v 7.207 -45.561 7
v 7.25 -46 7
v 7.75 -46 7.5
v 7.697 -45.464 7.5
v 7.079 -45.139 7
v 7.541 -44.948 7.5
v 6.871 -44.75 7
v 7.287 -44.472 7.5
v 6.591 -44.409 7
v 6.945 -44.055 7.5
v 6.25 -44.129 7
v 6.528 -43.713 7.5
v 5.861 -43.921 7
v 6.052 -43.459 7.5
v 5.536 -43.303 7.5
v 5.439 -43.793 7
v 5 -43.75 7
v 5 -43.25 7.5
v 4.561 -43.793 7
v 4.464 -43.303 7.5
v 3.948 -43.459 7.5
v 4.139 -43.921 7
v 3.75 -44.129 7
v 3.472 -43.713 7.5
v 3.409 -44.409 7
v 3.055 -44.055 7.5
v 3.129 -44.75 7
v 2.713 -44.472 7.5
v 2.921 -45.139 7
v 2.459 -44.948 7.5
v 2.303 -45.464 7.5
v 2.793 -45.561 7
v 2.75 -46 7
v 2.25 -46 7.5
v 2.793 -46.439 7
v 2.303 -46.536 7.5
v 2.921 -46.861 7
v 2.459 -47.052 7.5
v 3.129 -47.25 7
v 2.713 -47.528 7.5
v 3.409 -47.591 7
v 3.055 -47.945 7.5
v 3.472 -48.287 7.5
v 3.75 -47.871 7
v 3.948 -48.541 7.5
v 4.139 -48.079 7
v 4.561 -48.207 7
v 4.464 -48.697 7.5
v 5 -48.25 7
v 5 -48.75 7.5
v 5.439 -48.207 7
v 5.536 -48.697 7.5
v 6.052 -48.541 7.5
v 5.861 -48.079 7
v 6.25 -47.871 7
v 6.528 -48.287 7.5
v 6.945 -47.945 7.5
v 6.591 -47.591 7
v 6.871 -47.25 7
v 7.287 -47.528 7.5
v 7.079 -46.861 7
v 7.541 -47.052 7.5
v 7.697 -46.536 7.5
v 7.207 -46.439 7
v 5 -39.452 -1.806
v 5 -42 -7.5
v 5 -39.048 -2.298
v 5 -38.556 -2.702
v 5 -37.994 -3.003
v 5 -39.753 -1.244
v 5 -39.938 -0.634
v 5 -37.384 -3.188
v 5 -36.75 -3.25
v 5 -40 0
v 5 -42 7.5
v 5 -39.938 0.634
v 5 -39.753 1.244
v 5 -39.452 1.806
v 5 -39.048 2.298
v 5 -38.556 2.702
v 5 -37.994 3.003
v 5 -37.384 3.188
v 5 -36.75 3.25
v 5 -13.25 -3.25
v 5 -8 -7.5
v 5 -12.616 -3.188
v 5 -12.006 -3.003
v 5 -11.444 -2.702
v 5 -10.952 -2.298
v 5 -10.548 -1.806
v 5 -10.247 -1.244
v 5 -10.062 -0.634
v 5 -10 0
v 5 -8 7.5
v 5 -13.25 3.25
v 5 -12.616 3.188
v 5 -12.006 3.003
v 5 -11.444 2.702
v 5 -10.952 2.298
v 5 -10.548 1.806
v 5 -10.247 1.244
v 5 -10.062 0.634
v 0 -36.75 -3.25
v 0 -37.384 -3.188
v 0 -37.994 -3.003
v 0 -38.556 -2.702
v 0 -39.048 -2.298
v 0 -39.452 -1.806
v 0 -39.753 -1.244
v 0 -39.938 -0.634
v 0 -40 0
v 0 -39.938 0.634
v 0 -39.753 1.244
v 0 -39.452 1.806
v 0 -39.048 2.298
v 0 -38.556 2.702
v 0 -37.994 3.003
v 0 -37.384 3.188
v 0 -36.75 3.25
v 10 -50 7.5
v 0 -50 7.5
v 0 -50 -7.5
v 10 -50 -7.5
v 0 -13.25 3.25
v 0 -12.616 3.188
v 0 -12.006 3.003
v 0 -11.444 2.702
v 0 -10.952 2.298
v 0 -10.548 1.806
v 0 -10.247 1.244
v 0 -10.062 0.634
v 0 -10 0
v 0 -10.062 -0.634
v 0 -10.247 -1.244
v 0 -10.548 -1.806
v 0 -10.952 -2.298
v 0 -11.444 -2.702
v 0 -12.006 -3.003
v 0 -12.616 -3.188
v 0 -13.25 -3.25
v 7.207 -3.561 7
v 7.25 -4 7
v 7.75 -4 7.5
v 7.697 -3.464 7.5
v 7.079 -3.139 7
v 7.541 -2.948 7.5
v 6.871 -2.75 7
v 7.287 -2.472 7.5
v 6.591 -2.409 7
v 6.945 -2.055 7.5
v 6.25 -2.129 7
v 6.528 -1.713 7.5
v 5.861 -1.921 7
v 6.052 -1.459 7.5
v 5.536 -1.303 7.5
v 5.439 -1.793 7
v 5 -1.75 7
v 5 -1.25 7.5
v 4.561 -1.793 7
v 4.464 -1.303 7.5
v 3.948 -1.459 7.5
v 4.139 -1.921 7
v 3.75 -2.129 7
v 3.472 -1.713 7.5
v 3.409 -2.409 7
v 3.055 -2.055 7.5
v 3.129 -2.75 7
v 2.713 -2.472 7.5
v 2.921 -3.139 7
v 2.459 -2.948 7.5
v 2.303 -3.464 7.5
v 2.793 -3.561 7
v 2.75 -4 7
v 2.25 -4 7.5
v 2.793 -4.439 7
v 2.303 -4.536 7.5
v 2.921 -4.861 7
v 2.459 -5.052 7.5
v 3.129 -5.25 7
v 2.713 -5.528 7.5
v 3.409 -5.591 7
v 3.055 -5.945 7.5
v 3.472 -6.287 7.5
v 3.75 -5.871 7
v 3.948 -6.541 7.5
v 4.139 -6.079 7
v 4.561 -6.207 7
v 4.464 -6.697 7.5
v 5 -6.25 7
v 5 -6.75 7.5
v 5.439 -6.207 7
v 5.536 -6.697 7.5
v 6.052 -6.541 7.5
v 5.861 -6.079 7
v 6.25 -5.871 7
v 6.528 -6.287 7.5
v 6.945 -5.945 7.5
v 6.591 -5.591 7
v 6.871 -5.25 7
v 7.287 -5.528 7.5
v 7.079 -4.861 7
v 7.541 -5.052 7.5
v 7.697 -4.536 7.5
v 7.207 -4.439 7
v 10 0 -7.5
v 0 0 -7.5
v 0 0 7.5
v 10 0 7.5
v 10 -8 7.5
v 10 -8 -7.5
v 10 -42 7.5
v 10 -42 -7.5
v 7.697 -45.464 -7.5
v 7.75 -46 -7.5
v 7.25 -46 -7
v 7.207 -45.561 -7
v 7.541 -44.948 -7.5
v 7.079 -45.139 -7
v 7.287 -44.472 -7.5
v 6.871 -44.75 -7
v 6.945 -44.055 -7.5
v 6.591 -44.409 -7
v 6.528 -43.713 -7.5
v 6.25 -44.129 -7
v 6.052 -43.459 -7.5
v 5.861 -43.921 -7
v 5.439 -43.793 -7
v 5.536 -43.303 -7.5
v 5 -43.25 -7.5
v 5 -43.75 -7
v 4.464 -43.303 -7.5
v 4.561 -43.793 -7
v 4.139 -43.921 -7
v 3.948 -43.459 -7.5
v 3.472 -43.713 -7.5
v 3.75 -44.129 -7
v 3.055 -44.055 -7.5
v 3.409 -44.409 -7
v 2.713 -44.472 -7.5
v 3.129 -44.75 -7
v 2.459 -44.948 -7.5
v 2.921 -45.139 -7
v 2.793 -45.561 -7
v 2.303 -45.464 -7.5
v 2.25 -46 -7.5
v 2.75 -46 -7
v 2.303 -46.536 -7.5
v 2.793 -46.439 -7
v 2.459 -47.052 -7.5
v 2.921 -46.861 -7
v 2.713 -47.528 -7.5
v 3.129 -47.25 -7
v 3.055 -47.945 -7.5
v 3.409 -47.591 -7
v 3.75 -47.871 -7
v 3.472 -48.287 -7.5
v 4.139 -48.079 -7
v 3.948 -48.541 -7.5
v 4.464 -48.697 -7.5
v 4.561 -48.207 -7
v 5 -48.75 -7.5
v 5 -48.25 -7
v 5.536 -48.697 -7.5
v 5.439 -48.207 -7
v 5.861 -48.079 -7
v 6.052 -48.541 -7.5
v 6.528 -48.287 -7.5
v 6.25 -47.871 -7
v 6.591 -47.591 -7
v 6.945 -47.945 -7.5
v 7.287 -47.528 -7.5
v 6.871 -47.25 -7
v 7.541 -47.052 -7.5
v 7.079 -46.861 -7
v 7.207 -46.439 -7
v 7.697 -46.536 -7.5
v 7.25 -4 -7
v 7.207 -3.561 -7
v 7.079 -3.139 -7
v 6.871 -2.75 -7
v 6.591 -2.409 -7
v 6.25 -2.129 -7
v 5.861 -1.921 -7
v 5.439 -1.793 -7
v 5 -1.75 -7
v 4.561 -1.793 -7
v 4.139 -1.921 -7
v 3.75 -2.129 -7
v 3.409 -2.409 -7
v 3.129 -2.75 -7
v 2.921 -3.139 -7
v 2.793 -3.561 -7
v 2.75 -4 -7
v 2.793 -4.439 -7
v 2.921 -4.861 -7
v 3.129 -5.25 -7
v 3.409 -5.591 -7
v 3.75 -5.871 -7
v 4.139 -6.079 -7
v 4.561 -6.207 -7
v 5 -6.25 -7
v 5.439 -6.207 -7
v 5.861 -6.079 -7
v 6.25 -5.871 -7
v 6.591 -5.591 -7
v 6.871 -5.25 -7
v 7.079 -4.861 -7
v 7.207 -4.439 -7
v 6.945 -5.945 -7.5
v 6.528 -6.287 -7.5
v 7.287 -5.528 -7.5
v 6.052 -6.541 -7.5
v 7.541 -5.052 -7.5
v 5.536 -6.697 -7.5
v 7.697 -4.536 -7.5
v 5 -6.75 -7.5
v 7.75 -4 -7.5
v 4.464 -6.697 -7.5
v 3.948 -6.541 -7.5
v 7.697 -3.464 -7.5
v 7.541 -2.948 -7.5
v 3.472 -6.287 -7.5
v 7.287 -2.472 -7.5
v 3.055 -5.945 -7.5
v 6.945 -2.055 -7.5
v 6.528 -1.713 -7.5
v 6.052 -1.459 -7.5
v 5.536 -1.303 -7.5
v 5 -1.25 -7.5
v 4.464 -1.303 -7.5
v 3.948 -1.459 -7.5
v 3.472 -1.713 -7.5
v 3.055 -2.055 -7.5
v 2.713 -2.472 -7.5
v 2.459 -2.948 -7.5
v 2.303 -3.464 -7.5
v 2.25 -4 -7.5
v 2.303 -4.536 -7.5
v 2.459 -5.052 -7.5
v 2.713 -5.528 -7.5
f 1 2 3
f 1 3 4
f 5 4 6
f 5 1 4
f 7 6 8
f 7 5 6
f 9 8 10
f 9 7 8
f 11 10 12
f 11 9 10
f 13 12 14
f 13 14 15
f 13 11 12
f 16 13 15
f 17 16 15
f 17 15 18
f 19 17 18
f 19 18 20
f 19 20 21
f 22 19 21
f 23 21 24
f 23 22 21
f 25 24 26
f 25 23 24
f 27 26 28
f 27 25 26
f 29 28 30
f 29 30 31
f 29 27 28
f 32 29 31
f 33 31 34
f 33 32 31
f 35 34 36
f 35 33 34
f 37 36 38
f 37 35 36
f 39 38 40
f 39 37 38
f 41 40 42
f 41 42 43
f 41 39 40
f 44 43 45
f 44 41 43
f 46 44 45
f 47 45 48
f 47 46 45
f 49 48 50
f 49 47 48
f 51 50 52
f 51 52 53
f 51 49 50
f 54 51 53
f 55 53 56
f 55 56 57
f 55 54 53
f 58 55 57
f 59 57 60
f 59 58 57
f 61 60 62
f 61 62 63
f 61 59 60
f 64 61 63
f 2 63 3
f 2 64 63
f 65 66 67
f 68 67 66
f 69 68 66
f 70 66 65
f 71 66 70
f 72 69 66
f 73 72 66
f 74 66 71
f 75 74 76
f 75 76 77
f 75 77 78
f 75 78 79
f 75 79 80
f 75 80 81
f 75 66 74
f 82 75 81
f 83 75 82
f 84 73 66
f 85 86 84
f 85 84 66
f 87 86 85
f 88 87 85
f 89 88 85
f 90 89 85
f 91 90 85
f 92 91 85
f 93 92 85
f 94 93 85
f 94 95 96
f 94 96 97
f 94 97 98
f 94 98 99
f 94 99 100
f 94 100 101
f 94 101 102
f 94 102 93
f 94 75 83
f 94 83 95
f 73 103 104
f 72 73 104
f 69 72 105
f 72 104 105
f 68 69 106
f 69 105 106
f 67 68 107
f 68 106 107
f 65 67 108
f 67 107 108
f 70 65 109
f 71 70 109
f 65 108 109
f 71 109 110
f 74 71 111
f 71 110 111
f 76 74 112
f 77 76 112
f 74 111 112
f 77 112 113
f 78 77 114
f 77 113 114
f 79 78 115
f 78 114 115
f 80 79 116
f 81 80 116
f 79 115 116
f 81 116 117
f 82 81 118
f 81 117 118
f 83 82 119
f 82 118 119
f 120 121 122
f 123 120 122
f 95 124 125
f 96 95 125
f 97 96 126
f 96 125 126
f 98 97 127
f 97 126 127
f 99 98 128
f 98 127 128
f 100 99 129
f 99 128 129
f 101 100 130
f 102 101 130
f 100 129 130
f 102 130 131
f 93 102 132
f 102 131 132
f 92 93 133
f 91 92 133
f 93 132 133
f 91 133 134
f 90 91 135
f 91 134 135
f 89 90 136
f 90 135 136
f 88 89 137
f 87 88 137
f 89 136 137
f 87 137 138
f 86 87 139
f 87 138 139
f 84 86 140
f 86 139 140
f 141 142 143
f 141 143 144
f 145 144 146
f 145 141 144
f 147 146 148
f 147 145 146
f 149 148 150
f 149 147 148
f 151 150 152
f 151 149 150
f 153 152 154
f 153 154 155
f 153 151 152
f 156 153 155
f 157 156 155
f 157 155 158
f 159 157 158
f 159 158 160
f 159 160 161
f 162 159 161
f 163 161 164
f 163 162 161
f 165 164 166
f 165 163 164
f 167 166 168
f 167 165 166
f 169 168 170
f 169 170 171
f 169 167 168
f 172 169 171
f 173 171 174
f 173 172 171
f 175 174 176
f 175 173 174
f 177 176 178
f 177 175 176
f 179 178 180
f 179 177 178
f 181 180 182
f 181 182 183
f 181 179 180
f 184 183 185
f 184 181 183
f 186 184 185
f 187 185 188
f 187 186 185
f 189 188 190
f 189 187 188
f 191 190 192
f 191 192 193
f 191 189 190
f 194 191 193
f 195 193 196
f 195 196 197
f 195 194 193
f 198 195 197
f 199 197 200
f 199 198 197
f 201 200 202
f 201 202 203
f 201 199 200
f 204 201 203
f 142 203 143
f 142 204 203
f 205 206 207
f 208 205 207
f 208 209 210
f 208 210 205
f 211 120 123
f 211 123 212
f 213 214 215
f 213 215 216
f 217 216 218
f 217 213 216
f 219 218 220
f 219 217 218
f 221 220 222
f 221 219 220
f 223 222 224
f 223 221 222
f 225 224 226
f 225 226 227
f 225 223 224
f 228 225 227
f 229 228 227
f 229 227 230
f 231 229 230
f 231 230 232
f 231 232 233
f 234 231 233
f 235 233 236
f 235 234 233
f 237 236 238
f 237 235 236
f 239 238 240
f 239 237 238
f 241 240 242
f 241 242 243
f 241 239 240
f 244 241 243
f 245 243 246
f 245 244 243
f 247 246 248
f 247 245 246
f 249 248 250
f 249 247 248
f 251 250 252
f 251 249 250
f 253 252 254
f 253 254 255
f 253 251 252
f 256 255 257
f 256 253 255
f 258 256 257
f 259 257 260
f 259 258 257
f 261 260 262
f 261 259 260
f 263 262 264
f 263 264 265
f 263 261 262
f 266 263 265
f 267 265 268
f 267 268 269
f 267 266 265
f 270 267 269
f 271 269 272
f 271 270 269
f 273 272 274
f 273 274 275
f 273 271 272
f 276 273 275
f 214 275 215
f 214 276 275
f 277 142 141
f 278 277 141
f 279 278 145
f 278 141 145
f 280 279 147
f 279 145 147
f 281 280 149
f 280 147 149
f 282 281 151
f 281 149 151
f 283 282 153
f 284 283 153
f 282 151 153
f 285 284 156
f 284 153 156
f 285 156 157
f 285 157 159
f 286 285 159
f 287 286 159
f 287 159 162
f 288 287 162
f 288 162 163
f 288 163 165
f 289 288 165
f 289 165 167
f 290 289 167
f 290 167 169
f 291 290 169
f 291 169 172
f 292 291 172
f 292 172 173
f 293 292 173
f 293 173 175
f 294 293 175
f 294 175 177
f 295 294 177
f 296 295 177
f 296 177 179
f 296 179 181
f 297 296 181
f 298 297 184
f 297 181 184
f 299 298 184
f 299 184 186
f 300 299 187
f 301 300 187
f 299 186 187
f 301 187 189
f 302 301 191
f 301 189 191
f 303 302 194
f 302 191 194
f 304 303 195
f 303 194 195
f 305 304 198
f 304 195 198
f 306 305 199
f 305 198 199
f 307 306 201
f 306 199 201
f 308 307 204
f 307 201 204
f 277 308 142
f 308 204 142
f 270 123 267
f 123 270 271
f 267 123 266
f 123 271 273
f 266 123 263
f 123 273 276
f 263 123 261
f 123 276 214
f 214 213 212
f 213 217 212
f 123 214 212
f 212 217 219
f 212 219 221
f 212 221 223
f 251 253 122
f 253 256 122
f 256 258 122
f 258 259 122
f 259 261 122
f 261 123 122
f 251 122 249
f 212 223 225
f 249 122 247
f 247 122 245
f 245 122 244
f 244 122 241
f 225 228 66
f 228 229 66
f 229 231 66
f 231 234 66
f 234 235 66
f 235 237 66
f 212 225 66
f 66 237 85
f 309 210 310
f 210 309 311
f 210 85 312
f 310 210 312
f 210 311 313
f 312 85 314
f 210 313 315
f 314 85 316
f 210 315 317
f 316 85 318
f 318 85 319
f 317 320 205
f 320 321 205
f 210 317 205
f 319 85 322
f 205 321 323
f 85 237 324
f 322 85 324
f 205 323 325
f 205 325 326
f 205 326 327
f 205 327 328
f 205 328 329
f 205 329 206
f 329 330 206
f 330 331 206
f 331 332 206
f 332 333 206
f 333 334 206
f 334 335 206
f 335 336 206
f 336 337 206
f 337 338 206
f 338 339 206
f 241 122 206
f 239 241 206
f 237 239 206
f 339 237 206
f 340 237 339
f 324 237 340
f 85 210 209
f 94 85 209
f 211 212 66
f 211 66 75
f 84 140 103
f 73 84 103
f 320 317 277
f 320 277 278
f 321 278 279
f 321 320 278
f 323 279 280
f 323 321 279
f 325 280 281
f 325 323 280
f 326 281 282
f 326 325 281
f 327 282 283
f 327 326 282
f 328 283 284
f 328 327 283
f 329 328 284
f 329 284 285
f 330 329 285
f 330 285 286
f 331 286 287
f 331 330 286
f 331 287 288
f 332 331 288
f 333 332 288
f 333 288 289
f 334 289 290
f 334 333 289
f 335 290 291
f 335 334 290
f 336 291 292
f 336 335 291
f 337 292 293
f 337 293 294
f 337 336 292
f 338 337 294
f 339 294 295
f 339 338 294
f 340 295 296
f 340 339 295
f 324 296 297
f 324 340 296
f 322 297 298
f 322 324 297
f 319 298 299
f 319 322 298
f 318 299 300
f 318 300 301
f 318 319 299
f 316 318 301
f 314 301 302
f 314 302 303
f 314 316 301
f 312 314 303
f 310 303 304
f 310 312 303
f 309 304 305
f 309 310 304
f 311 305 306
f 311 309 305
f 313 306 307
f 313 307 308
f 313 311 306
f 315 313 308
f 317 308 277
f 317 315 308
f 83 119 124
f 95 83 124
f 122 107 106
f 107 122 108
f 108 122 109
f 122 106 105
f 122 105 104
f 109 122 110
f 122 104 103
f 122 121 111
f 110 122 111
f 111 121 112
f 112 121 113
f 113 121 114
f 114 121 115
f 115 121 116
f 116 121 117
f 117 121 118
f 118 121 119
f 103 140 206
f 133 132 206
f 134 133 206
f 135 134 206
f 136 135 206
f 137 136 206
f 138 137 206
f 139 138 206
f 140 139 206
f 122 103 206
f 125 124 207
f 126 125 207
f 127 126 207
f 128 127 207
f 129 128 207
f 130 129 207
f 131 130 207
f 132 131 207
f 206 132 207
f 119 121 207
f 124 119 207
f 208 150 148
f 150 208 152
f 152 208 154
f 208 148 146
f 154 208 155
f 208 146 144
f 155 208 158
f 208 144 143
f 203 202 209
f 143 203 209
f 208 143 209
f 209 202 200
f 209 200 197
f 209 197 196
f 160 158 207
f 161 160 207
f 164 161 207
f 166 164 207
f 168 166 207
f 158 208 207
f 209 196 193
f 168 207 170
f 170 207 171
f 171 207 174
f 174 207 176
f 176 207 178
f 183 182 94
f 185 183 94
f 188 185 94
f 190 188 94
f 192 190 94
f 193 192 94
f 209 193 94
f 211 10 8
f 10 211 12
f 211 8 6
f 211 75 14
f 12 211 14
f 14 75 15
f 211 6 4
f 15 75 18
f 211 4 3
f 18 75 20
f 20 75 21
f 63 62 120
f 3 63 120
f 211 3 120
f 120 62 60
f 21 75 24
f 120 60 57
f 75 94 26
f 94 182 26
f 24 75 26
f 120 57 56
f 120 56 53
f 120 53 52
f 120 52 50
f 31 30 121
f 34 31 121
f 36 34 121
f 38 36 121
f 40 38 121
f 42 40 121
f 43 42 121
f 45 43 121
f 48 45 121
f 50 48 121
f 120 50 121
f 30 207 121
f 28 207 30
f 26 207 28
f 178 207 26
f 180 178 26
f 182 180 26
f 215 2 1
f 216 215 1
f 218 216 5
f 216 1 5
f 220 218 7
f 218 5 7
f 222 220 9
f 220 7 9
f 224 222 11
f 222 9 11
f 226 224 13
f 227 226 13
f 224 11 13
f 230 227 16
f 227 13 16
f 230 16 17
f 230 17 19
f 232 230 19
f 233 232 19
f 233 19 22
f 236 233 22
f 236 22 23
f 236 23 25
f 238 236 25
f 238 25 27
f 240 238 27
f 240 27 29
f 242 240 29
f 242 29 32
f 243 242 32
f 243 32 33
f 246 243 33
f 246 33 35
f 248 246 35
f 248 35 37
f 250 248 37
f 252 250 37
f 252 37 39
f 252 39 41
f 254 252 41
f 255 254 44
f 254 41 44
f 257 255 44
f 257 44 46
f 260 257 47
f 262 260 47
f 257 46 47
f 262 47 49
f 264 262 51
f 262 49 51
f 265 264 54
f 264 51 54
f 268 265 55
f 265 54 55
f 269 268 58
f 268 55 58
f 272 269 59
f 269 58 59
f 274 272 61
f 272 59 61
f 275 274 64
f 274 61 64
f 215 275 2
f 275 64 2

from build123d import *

# Parameters (mm, degrees)
F1_DEPTH = 10
F2_W     = 34
F2_H     = 15
F3_DEPTH = 5
F4_R     = 2.25
F5_DEPTH = 25
F6_SIZE  = 0.5


with BuildPart() as f1:
    # F0 (on Right) → F1 (new body)
    with BuildSketch(Plane.YZ):
        Polygon((0, 7.5), (-50, 7.5), (-50, 3.25), (-50, 0), (-50, -3.25), (-50, -7.5), (0, -7.5), (0, 0), align=None)
        with BuildLine():
            ThreePointArc((-36.75, -3.25), (-40, 0), (-36.75, 3.25))
            Line((-36.75, 3.25), (-13.25, 3.25))
            ThreePointArc((-13.25, 3.25), (-10, 0), (-13.25, -3.25))
            Line((-13.25, -3.25), (-36.75, -3.25))
        make_face(mode=Mode.SUBTRACT)
    extrude(amount=F1_DEPTH)

    # F2 (on face) → F3 (cut)
    with BuildSketch(Plane.YZ.offset(10)):
        with Locations((-25, 0)):
            Rectangle(F2_W, F2_H)
    extrude(amount=-F3_DEPTH, mode=Mode.SUBTRACT)

    # F4 (on face) → F5 (cut)
    with BuildSketch(Plane.XY.offset(7.5)):
        with Locations((5, -46)):
            Circle(F4_R)
        with Locations((5, -4)):
            Circle(F4_R)
    extrude(amount=-F5_DEPTH, mode=Mode.SUBTRACT)

    # F6
    f6_edges = [f1.edges().sort_by_distance(p)[0] for p in [
        (2.75, -46, 7.5),
        (7.25, -46, 0),
        (2.75, -46, -7.5),
        (2.75, -4, 7.5),
        (7.25, -4, 0),
        (2.75, -4, -7.5),
    ]]
    chamfer(f6_edges, length=F6_SIZE)


solid = f1.part
